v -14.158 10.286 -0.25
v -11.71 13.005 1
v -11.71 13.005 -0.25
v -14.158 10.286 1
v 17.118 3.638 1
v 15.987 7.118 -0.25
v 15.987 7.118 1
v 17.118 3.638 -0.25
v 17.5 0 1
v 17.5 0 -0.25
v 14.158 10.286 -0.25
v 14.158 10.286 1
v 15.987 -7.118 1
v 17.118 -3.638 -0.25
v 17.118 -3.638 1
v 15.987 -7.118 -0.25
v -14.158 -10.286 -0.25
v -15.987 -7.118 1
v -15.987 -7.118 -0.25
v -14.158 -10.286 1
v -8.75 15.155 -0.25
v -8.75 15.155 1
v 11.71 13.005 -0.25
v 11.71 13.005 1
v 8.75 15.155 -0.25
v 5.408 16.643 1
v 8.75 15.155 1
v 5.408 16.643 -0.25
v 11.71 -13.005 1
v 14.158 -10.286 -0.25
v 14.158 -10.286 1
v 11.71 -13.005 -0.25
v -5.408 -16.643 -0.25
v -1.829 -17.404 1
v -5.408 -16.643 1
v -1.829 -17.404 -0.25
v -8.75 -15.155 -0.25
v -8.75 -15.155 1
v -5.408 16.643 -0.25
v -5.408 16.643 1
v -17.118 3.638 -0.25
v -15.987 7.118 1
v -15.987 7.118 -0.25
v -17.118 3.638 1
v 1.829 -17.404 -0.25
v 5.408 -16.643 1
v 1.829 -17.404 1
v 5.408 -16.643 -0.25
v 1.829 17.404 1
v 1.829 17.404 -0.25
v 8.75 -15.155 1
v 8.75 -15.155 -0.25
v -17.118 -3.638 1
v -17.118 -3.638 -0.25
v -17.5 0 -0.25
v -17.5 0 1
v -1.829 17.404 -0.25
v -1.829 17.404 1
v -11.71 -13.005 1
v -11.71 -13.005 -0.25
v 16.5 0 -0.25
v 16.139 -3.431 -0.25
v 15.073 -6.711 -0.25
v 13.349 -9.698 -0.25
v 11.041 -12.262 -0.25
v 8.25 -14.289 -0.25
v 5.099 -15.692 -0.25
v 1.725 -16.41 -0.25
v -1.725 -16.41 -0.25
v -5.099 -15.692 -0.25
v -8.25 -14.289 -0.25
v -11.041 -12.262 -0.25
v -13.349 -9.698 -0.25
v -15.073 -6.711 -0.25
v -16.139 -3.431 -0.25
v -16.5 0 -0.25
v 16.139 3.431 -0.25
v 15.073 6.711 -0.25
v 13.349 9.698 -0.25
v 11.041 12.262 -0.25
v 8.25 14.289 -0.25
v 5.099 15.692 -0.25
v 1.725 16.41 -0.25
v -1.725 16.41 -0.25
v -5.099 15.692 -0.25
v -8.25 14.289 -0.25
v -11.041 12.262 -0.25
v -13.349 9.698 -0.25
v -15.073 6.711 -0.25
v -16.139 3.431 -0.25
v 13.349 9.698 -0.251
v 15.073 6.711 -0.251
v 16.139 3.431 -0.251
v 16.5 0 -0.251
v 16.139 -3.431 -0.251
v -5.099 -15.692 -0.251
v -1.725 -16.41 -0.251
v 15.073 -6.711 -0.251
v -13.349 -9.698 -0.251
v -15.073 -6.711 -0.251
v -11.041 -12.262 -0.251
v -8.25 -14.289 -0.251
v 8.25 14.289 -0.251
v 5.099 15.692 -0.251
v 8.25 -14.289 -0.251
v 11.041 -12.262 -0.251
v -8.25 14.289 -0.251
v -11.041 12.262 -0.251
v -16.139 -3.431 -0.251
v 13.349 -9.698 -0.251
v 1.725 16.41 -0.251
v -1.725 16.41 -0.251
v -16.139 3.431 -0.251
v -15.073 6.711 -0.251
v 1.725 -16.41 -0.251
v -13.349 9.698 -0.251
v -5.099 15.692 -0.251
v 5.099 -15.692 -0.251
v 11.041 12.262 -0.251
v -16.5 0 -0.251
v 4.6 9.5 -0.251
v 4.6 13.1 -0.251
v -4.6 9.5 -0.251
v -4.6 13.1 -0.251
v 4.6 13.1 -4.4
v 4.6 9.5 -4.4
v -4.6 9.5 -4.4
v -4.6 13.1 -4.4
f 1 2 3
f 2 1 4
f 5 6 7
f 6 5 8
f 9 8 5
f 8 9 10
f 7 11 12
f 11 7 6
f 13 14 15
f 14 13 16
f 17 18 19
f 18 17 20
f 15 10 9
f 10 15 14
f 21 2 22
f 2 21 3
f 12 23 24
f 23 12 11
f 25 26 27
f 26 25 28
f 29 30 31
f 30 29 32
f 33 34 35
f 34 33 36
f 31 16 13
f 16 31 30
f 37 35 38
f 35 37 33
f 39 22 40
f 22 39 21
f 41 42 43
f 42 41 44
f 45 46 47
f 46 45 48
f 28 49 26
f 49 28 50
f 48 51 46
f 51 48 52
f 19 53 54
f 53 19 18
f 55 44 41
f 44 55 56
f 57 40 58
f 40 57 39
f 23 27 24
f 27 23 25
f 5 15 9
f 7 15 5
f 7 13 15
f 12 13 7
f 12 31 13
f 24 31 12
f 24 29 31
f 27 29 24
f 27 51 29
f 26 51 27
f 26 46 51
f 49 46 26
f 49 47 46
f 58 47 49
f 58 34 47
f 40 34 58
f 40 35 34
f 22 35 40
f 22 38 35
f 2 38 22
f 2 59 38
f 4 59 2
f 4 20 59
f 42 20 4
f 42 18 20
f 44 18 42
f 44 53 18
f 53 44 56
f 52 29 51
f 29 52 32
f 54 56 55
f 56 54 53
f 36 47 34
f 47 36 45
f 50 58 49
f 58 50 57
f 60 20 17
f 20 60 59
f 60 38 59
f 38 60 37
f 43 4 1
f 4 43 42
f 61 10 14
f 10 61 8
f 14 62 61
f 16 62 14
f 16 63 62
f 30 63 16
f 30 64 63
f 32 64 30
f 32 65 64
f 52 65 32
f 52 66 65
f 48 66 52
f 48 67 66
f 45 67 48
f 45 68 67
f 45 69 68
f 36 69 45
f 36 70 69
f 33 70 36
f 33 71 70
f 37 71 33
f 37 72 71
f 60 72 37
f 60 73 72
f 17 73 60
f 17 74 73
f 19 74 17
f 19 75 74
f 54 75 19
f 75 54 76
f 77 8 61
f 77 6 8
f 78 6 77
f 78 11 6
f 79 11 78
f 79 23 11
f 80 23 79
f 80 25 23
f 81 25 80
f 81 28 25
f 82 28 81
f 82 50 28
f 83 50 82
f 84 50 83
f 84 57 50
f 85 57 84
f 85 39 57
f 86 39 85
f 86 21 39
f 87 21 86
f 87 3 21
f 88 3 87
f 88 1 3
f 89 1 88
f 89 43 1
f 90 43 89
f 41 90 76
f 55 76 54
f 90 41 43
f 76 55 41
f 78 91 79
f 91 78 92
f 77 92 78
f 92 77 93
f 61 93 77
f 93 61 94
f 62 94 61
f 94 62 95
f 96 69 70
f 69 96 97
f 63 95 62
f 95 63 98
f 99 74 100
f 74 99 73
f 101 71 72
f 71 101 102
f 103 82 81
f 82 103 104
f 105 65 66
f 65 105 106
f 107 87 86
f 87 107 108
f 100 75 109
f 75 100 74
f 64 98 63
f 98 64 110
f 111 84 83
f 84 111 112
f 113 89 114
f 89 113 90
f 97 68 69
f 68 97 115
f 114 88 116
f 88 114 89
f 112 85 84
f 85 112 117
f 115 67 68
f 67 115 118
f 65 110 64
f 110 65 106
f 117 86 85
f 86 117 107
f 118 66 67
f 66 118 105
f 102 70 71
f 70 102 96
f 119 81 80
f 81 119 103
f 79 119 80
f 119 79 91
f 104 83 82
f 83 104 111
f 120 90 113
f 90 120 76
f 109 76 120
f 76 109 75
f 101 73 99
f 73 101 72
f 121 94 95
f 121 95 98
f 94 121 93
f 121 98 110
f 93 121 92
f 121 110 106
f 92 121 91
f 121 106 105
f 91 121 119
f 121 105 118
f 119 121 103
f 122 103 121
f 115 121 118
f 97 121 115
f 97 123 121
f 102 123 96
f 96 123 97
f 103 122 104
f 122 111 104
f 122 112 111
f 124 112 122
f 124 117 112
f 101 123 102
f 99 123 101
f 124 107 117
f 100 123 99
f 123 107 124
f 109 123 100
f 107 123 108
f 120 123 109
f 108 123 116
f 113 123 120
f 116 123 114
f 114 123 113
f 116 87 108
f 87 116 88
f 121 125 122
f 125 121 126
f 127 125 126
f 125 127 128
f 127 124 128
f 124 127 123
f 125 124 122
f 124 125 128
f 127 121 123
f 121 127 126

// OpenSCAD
T = 1; // touchpad thickness
ADH = .25; // adhesive thickness
R = 35 / 2; // touchpad radius
SAFE = 1; // safe zone width

module touchpad() {
  color("#1a1c2c")
    cylinder(h=T, r=R);
  color("yellow")
    translate([0, 0, -ADH])
      cylinder(h=ADH, r=R);
  color("red")
    translate([0, 0, -ADH - .001])
      cylinder(h=ADH, r=R - SAFE);
  color("white")
    translate([-9.2 / 2, R - 8, -4.4])
      cube([9.2, 3.6, 4.4]);
}

touchpad();
